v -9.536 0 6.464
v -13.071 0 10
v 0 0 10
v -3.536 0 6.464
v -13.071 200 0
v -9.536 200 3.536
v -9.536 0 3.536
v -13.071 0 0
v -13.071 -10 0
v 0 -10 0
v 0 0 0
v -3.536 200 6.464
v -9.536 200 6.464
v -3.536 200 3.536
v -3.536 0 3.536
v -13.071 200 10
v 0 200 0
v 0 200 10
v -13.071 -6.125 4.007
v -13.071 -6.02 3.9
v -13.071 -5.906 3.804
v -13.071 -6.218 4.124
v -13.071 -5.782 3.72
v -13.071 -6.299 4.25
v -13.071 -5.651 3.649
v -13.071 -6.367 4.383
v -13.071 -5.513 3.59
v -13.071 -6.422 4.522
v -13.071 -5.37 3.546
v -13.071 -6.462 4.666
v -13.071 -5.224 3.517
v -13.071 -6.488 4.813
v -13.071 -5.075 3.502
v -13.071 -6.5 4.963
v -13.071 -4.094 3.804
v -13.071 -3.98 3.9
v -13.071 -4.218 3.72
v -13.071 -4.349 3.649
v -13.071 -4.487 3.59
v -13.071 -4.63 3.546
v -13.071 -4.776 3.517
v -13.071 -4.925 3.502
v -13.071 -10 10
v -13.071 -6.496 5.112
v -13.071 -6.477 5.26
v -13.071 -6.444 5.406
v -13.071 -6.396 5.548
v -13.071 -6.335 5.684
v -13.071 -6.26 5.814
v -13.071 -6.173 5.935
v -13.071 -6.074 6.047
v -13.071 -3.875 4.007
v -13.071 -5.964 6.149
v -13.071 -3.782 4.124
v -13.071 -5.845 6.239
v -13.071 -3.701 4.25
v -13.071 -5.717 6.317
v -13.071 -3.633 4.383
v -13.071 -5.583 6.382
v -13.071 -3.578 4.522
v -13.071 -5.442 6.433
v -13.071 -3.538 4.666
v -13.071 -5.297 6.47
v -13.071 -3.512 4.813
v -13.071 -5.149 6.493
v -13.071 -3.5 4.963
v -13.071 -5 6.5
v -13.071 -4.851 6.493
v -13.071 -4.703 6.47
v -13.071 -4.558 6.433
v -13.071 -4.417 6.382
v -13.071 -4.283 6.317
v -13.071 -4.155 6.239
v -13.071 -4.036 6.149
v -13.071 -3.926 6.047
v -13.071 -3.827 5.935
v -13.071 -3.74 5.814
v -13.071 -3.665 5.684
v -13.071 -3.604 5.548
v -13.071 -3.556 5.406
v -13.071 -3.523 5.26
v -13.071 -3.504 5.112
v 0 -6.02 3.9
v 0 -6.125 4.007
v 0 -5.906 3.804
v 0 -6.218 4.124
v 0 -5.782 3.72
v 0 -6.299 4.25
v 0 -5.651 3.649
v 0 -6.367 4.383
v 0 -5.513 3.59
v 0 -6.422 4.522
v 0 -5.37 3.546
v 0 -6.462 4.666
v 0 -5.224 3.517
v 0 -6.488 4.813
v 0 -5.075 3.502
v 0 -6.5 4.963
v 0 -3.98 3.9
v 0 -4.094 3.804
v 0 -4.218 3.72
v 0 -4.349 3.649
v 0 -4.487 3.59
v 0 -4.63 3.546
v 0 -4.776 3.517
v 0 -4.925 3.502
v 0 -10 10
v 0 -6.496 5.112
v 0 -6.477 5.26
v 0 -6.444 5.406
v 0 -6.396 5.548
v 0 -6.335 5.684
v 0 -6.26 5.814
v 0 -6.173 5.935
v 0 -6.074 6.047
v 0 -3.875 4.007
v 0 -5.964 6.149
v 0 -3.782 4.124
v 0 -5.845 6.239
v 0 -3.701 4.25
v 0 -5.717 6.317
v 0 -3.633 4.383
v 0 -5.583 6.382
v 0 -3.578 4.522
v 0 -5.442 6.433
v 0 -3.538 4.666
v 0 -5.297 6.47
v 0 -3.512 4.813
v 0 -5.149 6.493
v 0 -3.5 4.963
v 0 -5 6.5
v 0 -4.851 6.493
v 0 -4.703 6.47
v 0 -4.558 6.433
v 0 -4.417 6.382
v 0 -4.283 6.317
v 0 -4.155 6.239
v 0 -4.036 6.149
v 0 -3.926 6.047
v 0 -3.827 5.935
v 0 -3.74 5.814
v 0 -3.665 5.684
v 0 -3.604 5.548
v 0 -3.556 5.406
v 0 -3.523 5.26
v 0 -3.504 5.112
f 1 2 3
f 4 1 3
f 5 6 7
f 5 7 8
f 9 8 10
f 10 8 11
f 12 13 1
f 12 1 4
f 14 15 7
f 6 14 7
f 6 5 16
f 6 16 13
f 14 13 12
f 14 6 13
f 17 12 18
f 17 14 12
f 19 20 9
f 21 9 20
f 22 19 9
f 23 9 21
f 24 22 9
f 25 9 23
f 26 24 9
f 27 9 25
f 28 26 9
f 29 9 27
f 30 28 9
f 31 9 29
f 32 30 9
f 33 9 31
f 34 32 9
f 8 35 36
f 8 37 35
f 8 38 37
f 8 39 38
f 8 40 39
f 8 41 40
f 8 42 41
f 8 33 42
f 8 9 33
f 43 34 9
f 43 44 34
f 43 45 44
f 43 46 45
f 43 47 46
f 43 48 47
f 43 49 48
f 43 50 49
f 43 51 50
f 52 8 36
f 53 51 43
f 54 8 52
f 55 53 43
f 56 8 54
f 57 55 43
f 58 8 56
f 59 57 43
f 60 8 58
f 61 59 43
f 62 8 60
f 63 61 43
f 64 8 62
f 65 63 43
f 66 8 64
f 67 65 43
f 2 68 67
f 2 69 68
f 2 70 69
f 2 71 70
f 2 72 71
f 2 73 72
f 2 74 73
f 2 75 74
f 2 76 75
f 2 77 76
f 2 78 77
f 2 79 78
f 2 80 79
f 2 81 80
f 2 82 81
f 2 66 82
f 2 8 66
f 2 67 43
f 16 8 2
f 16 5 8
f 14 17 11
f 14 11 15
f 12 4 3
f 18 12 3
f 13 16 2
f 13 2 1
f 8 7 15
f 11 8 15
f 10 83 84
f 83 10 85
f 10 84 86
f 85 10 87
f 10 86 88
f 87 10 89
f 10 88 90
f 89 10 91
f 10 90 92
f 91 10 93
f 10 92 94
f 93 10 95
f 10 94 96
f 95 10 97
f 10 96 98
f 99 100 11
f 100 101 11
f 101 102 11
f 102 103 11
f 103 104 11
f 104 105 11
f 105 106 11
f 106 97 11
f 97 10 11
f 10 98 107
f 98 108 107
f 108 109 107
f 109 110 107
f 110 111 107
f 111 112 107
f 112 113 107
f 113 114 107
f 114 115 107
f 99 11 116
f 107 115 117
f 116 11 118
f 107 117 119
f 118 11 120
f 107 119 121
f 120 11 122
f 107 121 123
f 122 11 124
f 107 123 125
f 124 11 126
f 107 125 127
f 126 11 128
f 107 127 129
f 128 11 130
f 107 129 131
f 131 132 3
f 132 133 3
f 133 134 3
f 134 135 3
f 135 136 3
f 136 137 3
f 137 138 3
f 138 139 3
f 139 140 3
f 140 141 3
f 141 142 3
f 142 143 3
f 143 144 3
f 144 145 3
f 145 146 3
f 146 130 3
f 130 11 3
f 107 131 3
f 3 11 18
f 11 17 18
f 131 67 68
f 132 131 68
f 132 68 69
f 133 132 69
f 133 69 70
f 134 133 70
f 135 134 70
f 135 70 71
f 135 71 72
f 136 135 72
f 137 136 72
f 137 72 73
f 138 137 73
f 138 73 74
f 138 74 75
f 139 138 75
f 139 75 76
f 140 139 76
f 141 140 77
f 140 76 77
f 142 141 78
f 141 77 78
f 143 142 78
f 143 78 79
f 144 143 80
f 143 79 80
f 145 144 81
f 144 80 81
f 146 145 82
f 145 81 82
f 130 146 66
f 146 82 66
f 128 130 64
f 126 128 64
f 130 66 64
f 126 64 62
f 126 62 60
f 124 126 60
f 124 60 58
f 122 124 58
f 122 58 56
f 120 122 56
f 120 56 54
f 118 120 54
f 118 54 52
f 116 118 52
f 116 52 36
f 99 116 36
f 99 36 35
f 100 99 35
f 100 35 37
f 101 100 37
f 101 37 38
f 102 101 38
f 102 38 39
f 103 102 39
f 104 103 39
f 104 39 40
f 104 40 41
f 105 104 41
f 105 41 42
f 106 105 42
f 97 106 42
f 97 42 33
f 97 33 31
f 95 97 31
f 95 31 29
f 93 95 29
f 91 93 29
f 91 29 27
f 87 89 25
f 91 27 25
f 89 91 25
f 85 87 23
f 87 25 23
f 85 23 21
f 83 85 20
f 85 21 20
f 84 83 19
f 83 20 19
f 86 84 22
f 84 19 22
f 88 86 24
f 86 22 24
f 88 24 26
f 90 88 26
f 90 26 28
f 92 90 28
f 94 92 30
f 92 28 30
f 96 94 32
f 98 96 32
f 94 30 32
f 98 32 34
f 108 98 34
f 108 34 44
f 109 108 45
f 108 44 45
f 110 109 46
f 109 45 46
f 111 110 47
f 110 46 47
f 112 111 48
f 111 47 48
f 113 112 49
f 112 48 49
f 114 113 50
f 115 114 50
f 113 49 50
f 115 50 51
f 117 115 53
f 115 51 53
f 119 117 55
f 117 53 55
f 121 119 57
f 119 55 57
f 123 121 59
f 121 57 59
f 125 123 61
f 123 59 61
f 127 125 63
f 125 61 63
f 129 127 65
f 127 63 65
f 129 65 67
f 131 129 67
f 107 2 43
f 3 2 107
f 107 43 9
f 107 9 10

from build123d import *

# Parameters (mm, degrees)
BOSS_EXTRUDE1_DEPTH = 200
SKETCH2_W           = 13.071067812
SKETCH2_H           = 10
BOSS_EXTRUDE2_DEPTH = 10
SKETCH3_R           = 1.5
CUT_EXTRUDE1_DEPTH  = 30


with BuildPart() as part:
    # Sketch1 → Boss-Extrude1 (new body)
    with BuildSketch(Plane(origin=(0, 0, 0), x_dir=(1, 0, 0), z_dir=(0, 1, 0))):
        Polygon((0, 0), (-3.535533906, -3.535533906), (-9.535533906, -3.535533906), (-13.071067812, 0), (-13.071067812, -10), (-9.535533906, -6.464466094), (-3.535533906, -6.464466094), (0, -10), align=None)
    extrude(amount=BOSS_EXTRUDE1_DEPTH)

    # Sketch2 → Boss-Extrude2 (add)
    with BuildSketch(Plane.XZ):
        with Locations((-6.535533906, 5)):
            Rectangle(SKETCH2_W, SKETCH2_H)
    extrude(amount=BOSS_EXTRUDE2_DEPTH)

    # Sketch3 → Cut-Extrude1 (cut)
    with BuildSketch(Plane.ZY.offset(13.071067812)):
        with Locations((5, -5)):
            Circle(SKETCH3_R)
    extrude(amount=-CUT_EXTRUDE1_DEPTH, mode=Mode.SUBTRACT)


solid = part.part
